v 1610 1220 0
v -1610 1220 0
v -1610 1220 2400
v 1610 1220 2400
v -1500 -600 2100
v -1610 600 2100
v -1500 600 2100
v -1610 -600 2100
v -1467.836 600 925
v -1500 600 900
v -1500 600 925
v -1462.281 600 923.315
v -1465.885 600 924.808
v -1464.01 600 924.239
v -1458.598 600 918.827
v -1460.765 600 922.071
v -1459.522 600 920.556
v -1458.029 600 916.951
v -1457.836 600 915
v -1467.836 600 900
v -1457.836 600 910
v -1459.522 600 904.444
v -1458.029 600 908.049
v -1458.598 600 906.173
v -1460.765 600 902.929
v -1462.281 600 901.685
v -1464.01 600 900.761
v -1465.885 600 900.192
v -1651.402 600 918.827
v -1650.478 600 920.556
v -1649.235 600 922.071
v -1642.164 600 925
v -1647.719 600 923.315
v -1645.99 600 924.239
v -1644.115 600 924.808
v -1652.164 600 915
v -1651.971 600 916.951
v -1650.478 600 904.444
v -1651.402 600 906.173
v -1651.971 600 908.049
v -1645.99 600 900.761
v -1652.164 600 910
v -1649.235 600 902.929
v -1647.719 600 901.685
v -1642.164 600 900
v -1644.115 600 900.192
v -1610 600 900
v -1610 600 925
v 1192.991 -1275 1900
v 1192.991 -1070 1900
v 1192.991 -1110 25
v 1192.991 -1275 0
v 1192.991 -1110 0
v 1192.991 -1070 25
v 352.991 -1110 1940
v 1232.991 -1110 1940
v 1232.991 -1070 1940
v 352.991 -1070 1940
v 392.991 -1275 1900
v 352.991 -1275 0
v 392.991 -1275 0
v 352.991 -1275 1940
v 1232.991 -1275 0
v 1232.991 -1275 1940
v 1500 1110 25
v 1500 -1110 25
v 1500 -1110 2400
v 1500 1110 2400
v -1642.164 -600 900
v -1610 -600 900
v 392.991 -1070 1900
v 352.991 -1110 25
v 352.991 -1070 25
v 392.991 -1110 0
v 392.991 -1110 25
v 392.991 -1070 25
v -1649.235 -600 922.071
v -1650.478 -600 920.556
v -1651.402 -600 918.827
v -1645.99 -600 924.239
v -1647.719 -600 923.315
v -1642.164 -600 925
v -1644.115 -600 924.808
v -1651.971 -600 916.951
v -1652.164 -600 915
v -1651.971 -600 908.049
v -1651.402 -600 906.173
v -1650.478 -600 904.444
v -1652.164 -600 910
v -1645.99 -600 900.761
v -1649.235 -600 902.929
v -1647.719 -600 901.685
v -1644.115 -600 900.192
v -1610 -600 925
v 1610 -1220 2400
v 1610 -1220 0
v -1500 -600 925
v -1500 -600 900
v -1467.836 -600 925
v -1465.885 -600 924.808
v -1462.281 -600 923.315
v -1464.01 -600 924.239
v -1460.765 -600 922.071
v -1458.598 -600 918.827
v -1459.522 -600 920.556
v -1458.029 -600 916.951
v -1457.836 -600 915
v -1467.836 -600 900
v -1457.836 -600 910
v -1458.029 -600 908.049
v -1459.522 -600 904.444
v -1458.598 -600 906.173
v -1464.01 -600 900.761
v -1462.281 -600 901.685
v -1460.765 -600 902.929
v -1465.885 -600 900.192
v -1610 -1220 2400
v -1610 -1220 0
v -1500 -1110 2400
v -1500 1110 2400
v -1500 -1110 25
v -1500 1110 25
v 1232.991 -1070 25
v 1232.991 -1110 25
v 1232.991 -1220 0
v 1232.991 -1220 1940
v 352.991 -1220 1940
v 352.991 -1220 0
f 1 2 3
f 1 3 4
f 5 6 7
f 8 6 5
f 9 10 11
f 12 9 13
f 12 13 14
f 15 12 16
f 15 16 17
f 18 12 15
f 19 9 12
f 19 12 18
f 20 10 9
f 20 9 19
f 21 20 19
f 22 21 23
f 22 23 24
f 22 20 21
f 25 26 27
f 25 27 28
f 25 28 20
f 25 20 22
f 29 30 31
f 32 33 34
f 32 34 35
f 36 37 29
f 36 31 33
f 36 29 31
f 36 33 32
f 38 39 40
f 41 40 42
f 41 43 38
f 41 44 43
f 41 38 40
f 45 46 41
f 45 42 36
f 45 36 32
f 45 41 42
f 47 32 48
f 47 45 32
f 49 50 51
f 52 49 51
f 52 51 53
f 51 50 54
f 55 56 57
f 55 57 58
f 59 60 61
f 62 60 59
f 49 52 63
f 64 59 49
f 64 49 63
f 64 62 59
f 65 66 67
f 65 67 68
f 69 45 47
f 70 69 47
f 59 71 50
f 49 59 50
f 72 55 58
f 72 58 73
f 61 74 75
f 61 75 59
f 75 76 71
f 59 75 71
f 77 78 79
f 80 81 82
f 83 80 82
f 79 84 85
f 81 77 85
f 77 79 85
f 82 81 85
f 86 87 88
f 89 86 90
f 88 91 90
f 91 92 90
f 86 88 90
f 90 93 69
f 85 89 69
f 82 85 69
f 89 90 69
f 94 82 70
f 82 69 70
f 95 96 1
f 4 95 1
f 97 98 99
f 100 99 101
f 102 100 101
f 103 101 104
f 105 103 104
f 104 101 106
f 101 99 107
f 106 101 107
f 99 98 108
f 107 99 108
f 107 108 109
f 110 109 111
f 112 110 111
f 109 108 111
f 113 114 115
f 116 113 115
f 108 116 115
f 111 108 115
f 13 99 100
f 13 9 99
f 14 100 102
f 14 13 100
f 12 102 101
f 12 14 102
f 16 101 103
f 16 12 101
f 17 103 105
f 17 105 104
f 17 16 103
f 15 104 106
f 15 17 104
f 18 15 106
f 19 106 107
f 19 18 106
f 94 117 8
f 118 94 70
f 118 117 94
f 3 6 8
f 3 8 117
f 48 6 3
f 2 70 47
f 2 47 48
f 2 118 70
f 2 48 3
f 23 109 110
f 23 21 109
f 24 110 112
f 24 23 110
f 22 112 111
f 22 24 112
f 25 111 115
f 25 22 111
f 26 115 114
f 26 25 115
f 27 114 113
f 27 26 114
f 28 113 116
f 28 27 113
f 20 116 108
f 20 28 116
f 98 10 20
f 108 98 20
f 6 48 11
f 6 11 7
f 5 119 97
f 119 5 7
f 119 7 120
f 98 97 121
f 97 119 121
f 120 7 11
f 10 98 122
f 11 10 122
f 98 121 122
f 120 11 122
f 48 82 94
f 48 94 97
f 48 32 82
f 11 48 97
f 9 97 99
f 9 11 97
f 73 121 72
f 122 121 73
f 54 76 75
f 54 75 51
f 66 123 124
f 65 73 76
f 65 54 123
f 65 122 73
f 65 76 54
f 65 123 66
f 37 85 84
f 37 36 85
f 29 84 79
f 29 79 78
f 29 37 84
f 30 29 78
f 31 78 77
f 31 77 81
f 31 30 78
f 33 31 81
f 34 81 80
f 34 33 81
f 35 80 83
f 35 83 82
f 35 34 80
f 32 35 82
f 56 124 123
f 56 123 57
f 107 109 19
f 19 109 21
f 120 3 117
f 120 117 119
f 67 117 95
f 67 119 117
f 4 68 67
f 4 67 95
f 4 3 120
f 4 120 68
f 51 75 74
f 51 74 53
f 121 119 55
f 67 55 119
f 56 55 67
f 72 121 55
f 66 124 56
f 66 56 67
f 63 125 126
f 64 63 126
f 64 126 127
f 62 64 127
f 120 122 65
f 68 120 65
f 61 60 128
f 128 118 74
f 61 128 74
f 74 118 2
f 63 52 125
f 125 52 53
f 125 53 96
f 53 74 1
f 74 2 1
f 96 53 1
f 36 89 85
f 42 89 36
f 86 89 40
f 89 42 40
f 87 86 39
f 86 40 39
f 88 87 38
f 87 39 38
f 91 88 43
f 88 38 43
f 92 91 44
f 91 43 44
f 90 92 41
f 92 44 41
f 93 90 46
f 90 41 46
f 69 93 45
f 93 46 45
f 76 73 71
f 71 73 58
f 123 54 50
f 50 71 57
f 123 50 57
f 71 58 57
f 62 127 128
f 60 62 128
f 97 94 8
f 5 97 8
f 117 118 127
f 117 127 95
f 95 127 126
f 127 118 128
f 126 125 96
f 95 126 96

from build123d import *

# Parameters (mm, degrees)
F0_W          = 3220
F0_H          = 2440
F0_W_2        = 3000
F0_H_2        = 2220
F1_DEPTH      = 25
F2_DEPTH      = 2400
F3_W          = 800
F3_H          = 1900
F4_DEPTH      = 110
F5_DEPTH      = 55
F5_DEPTH_BACK = 150
F6_W          = 1200
F6_H          = 1200
F7_DEPTH      = 2505
F8_W          = 194.32722
F8_H          = 1200
F9_DEPTH      = 25
F10_R         = 10


with BuildPart() as f1:
    # F0 (on Top) → F1 (new body)
    with BuildSketch(Plane.XY):
        Rectangle(F0_W, F0_H)
        Rectangle(F0_W_2, F0_H_2, mode=Mode.SUBTRACT)
        Rectangle(F0_W_2, F0_H_2)
    extrude(amount=F1_DEPTH)

    # F0 (on Top) → F2 (join)
    with BuildSketch(Plane.XY):
        Rectangle(F0_W, F0_H)
        Rectangle(F0_W_2, F0_H_2, mode=Mode.SUBTRACT)
    extrude(amount=F2_DEPTH)

    # F3 (on face) → F4 (cut)
    with BuildSketch(Plane.XZ.offset(1220)):
        with Locations((792.991194, 950)):
            Rectangle(F3_W, F3_H)
    extrude(amount=-F4_DEPTH, mode=Mode.SUBTRACT)

    # F3 (on face) → F5 (join, two sides)
    with BuildSketch(Plane.XZ.offset(1220)) as f5_sk:
        Polygon((1192.991194, 1900), (1192.991194, 0), (1232.991194, 0), (1232.991194, 1940), (352.991194, 1940), (352.991194, 0), (392.991194, 0), (392.991194, 1900), align=None)
    extrude(amount=F5_DEPTH)
    extrude(f5_sk.sketch, amount=-F5_DEPTH_BACK)

    # F6 (on face) → F7 (cut)
    with BuildSketch(Plane(origin=(-1610, 0, 0), x_dir=(0, -1, 0), z_dir=(-1, 0, 0))):
        with Locations((0, 1500)):
            Rectangle(F6_W, F6_H)
    extrude(amount=-F7_DEPTH, mode=Mode.SUBTRACT)

    # F8 (on face) → F9 (join)
    with BuildSketch(Plane.XY.offset(900)):
        with Locations((-1555, 0)):
            Rectangle(F8_W, F8_H)
    extrude(amount=F9_DEPTH)

    # F10
    f10_edges = [f1.edges().sort_by_distance(p)[0] for p in [
        (-1457.83639, 0, 925),
        (-1457.83639, 0, 900),
        (-1652.16361, 0, 925),
        (-1652.16361, 0, 900),
    ]]
    fillet(f10_edges, radius=F10_R)


solid = f1.part
